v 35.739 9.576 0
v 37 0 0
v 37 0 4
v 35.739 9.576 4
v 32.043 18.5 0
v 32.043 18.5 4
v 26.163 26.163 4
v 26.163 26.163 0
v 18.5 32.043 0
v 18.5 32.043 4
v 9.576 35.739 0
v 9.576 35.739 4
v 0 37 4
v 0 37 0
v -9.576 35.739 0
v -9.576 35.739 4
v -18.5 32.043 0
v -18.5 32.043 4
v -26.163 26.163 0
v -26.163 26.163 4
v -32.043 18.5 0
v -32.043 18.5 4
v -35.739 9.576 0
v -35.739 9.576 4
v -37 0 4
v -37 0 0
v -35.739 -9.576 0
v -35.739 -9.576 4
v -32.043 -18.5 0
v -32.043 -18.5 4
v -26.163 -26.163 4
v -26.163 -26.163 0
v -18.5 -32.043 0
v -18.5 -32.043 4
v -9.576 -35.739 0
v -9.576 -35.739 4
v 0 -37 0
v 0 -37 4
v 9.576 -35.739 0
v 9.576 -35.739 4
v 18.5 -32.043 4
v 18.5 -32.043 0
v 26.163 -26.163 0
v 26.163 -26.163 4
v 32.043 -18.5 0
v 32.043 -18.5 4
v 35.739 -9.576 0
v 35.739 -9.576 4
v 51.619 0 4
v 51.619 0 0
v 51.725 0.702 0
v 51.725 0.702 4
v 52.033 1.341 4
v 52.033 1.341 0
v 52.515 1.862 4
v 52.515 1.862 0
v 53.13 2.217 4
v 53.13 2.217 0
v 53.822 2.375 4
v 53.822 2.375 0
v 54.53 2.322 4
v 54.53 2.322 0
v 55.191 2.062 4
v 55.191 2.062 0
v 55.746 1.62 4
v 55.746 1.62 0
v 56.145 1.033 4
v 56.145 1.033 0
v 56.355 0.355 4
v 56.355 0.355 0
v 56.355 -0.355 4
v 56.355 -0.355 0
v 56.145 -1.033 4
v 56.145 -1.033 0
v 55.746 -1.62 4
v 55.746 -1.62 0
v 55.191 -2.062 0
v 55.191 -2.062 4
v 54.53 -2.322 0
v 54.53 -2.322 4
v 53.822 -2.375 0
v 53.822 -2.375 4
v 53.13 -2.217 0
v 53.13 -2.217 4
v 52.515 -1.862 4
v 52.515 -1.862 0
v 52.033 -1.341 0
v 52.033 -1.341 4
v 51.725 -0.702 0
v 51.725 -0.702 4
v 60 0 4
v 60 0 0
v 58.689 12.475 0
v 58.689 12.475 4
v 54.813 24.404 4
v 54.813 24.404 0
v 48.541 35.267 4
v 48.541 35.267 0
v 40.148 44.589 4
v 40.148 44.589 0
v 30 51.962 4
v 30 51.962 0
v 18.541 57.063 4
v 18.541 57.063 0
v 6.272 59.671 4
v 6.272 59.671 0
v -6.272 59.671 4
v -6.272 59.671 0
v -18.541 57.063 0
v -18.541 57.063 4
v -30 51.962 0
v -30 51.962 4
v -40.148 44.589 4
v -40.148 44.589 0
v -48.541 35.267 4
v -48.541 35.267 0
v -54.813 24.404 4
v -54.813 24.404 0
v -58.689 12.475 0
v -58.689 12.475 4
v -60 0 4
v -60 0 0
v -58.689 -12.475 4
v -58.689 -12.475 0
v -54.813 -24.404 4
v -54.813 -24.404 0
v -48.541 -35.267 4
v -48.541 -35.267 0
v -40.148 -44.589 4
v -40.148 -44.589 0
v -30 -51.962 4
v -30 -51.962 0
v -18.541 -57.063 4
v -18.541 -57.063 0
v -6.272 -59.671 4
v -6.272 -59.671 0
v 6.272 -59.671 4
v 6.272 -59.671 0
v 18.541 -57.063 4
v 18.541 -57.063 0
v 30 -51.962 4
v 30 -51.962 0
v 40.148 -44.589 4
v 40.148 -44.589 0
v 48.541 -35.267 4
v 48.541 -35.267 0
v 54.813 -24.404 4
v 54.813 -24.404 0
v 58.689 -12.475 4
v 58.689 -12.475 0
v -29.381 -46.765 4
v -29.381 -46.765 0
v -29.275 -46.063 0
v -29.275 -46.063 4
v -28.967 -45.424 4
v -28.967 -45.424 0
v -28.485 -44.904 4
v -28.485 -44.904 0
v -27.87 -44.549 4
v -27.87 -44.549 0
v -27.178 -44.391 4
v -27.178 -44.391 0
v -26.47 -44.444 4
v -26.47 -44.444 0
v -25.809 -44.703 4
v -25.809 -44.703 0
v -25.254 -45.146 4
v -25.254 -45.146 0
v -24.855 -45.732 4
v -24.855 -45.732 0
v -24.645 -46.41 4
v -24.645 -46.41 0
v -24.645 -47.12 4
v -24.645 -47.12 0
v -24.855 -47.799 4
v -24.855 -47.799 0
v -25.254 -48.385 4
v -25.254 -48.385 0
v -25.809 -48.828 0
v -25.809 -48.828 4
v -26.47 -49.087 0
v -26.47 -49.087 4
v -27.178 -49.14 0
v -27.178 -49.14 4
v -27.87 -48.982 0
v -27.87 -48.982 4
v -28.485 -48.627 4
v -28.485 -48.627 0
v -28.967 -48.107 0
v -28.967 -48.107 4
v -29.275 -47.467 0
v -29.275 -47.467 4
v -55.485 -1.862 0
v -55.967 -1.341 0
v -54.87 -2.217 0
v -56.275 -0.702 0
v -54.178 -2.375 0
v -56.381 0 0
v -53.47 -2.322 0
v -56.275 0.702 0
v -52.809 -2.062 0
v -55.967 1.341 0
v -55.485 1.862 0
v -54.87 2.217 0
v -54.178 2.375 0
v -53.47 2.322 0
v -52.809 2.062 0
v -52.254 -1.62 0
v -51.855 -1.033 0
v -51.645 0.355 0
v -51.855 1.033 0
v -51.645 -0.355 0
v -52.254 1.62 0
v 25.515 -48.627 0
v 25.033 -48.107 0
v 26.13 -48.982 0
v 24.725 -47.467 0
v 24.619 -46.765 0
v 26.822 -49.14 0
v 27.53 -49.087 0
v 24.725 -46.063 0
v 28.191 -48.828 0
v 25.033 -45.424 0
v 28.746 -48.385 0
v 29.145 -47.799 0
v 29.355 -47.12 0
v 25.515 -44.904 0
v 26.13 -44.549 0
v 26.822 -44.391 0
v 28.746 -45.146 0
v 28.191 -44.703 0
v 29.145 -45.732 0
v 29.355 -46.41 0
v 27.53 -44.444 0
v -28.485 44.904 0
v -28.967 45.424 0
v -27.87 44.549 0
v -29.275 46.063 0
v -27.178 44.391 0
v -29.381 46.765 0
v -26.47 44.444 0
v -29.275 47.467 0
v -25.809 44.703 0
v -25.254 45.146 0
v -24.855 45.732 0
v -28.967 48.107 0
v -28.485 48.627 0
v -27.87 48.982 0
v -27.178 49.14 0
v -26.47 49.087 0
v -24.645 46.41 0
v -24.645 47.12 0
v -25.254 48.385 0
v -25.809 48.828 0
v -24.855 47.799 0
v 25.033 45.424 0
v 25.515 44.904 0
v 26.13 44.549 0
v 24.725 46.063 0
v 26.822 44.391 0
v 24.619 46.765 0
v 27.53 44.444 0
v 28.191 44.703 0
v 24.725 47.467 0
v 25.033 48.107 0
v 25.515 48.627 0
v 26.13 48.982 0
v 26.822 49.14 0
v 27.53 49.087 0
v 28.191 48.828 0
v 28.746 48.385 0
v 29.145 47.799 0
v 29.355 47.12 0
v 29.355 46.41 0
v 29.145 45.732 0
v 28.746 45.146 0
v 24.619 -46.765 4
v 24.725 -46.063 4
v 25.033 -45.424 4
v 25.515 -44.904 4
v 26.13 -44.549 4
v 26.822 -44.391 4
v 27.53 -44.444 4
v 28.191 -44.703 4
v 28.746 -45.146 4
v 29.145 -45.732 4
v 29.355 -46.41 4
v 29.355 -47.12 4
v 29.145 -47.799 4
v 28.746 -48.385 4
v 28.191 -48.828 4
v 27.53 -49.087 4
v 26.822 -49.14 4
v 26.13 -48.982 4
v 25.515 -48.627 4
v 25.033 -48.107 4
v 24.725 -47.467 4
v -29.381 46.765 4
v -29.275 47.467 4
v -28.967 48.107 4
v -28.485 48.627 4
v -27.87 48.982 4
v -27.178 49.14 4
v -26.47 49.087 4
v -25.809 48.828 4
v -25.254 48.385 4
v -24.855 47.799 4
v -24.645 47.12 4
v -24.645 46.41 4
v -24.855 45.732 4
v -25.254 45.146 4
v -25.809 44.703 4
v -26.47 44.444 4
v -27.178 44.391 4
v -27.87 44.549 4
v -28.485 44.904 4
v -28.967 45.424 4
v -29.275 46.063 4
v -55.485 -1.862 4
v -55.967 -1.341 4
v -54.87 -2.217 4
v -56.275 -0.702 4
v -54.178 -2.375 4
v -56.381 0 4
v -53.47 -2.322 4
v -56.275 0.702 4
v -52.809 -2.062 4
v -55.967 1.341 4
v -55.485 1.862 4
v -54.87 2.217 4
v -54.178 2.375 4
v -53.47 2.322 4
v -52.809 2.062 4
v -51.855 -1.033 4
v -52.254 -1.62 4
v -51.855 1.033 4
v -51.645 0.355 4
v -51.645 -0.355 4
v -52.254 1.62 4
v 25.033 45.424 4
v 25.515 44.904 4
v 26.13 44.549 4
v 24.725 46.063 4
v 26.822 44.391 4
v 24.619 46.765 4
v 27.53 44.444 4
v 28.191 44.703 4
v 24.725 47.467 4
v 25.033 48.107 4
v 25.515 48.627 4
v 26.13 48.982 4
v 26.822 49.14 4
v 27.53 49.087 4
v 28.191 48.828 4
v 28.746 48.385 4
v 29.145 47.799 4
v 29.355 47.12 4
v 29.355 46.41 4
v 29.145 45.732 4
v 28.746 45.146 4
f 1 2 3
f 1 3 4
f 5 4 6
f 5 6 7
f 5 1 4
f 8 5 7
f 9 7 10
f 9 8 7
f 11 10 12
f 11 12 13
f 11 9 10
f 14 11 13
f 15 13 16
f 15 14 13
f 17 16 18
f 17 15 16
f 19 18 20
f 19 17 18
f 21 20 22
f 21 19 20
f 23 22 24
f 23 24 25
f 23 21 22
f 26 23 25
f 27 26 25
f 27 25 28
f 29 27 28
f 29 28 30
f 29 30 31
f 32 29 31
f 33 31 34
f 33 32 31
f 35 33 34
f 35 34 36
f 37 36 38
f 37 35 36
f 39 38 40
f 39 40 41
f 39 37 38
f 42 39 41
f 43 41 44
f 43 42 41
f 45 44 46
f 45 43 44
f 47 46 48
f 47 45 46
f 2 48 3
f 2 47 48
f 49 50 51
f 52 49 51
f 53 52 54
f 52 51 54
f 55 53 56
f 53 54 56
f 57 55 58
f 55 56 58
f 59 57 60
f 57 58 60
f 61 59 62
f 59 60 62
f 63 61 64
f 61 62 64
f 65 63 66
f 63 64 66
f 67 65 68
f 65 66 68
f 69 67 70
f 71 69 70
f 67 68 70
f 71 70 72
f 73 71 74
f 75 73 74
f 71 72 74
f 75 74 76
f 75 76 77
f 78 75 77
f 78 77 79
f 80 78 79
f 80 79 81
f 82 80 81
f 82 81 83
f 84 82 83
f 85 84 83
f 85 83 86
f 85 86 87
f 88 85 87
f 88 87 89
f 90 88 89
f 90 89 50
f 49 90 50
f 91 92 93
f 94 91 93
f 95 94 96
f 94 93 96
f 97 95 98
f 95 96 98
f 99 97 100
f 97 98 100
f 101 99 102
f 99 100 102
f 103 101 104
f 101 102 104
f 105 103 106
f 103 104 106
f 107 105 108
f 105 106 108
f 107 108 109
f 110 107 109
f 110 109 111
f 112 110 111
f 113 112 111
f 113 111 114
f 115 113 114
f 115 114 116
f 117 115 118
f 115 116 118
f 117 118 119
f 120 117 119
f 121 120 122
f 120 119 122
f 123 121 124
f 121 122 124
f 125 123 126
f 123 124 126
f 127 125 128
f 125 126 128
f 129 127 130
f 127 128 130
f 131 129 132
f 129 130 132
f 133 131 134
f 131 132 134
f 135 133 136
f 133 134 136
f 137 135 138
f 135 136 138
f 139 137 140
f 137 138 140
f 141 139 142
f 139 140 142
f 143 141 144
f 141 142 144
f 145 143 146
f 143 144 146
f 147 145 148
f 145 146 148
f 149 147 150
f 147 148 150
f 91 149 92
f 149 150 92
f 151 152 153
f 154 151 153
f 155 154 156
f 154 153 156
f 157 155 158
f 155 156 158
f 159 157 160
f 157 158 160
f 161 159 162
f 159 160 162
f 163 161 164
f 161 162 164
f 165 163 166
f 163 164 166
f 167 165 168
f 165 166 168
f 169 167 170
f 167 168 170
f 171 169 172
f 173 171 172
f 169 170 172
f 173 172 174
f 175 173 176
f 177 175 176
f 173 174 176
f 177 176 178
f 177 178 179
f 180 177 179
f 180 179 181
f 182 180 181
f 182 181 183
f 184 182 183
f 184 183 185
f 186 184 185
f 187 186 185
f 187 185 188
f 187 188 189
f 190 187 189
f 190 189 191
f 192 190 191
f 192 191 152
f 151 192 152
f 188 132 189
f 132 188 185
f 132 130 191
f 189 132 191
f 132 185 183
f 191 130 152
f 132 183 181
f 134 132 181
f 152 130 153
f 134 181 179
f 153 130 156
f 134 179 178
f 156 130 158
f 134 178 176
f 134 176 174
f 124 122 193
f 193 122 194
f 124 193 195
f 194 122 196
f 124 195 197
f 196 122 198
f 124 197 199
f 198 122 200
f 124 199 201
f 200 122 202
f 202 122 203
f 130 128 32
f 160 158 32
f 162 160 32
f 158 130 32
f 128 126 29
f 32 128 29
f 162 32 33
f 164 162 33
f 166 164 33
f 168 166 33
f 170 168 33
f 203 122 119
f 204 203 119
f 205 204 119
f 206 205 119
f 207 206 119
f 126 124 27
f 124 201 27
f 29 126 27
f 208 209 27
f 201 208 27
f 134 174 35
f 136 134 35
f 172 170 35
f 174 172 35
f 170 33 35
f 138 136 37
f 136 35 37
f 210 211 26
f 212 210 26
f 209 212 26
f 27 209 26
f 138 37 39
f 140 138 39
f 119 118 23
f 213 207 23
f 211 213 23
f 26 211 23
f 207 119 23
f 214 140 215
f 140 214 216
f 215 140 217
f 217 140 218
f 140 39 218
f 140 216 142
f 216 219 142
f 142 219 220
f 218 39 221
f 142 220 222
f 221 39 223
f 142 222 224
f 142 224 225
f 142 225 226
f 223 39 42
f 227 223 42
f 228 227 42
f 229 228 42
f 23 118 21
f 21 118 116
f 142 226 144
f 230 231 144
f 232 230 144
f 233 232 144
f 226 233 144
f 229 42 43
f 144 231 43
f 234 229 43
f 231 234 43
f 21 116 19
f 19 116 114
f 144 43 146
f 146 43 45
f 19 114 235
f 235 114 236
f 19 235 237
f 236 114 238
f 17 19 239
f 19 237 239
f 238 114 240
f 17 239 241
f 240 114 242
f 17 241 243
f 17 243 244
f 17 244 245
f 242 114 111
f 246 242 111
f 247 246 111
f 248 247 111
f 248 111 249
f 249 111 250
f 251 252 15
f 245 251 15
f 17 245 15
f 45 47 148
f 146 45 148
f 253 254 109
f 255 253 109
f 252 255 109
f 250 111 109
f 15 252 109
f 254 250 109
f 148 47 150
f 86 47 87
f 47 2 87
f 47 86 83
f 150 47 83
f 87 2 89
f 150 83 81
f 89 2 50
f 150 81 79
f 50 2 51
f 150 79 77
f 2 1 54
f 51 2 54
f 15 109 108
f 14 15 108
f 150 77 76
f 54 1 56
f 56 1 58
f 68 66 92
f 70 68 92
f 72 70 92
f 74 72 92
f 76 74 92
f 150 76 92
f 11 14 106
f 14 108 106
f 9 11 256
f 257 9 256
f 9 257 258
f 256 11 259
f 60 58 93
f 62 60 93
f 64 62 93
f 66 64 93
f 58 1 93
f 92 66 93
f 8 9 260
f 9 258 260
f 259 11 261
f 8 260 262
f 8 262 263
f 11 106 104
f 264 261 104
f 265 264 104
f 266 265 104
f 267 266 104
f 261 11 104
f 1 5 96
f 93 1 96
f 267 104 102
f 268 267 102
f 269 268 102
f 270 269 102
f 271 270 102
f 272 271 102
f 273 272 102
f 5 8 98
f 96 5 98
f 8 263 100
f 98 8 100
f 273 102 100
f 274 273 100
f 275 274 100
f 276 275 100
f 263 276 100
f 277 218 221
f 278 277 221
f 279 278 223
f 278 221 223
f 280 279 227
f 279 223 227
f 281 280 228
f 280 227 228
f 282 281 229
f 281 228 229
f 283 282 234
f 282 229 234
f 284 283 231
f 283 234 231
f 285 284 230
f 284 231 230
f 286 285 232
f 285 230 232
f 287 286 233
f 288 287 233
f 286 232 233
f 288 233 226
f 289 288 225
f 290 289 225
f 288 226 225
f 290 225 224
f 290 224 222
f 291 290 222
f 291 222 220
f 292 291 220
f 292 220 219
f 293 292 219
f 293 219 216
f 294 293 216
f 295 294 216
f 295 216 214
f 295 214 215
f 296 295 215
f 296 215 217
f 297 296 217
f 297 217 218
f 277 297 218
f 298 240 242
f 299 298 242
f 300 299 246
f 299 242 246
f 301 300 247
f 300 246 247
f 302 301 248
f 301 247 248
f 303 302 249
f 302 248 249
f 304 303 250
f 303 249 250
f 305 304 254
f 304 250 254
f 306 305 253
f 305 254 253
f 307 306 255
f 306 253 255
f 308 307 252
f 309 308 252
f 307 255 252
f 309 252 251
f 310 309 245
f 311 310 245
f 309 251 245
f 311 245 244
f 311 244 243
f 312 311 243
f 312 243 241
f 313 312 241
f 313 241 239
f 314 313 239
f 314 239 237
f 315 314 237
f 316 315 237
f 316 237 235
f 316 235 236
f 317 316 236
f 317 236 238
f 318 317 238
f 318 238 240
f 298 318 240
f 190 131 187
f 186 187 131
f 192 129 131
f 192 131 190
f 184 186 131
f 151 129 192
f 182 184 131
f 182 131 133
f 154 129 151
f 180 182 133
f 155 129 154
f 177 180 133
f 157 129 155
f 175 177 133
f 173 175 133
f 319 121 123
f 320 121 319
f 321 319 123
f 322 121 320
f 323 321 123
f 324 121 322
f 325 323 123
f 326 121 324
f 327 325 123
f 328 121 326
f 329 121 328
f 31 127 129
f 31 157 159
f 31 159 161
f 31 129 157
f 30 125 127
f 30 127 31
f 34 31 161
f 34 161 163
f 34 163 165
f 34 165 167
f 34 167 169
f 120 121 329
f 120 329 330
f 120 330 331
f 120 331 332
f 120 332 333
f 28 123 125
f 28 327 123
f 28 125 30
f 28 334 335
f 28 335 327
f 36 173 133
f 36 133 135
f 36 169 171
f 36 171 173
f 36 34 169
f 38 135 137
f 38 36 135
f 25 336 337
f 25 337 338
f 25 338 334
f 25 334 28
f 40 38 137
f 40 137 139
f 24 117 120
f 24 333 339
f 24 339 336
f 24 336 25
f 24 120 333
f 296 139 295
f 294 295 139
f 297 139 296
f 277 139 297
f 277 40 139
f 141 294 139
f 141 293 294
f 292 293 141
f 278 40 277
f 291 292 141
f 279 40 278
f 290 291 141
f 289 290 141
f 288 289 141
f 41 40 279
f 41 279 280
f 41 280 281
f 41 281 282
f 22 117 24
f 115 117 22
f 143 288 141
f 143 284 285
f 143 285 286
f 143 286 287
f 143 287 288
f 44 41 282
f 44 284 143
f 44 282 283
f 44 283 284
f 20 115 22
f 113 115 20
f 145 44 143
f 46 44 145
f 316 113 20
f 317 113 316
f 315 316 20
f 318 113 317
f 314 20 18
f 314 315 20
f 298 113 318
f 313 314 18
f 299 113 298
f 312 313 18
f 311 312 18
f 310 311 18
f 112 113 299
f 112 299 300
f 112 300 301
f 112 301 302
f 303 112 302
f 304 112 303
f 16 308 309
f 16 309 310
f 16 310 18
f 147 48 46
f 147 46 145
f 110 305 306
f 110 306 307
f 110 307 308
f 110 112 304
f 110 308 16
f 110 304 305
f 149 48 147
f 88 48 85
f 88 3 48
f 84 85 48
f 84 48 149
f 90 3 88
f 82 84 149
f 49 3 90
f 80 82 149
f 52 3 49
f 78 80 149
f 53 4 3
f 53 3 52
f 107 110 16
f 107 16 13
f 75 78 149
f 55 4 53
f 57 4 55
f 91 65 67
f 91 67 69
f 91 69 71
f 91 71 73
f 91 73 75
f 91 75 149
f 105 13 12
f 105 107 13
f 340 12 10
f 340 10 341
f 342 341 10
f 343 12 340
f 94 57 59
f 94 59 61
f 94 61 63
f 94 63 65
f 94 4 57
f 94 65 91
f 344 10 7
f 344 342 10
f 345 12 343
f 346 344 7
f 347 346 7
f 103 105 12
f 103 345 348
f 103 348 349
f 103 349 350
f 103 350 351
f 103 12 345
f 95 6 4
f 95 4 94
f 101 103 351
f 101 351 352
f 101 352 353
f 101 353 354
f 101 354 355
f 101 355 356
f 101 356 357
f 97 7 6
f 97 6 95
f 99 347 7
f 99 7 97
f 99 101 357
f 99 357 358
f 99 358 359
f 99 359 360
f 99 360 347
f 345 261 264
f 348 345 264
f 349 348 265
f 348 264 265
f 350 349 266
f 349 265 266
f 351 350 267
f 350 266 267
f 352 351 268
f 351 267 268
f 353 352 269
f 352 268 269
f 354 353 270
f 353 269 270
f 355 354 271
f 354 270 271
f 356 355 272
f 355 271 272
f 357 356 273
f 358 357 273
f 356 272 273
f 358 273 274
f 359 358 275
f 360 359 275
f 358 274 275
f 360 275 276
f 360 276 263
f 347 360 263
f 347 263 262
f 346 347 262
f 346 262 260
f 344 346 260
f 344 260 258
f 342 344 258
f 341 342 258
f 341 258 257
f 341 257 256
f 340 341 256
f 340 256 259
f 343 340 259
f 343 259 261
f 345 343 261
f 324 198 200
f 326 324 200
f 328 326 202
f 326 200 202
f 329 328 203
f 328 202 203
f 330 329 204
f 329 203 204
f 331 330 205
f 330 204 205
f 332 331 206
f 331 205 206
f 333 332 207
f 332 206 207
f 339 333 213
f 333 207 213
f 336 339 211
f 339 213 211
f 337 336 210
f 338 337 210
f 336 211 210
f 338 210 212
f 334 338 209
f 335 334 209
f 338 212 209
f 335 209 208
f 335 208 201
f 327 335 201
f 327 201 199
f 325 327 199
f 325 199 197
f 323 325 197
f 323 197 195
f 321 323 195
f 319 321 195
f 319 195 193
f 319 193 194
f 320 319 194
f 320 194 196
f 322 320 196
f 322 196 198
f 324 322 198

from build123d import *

# Parameters (mm, degrees)
SKETCH1_R                   = 60
SKETCH1_R_2                 = 37
BOSS_EXTRUDE1_DEPTH         = 4
F_3_16_0_1875_DOWEL_HOLE1_D = 4.7625


with BuildPart() as part:
    # Sketch1 → Boss-Extrude1 (new body)
    with BuildSketch(Plane.XY):
        Circle(SKETCH1_R)
        Circle(SKETCH1_R_2, mode=Mode.SUBTRACT)
    extrude(amount=BOSS_EXTRUDE1_DEPTH)

    # 3/16 (0.1875) Dowel Hole1 (through all)
    with Locations(Plane(origin=(-54, 0, 4), x_dir=(1, 0, 0), z_dir=(0, 0, 1))):
        with Locations((0, 0), (108, 0), (27, 46.765371804), (27, -46.765371804), (81, 46.765371804), (81, -46.765371804)):
            Hole(F_3_16_0_1875_DOWEL_HOLE1_D / 2)


solid = part.part
